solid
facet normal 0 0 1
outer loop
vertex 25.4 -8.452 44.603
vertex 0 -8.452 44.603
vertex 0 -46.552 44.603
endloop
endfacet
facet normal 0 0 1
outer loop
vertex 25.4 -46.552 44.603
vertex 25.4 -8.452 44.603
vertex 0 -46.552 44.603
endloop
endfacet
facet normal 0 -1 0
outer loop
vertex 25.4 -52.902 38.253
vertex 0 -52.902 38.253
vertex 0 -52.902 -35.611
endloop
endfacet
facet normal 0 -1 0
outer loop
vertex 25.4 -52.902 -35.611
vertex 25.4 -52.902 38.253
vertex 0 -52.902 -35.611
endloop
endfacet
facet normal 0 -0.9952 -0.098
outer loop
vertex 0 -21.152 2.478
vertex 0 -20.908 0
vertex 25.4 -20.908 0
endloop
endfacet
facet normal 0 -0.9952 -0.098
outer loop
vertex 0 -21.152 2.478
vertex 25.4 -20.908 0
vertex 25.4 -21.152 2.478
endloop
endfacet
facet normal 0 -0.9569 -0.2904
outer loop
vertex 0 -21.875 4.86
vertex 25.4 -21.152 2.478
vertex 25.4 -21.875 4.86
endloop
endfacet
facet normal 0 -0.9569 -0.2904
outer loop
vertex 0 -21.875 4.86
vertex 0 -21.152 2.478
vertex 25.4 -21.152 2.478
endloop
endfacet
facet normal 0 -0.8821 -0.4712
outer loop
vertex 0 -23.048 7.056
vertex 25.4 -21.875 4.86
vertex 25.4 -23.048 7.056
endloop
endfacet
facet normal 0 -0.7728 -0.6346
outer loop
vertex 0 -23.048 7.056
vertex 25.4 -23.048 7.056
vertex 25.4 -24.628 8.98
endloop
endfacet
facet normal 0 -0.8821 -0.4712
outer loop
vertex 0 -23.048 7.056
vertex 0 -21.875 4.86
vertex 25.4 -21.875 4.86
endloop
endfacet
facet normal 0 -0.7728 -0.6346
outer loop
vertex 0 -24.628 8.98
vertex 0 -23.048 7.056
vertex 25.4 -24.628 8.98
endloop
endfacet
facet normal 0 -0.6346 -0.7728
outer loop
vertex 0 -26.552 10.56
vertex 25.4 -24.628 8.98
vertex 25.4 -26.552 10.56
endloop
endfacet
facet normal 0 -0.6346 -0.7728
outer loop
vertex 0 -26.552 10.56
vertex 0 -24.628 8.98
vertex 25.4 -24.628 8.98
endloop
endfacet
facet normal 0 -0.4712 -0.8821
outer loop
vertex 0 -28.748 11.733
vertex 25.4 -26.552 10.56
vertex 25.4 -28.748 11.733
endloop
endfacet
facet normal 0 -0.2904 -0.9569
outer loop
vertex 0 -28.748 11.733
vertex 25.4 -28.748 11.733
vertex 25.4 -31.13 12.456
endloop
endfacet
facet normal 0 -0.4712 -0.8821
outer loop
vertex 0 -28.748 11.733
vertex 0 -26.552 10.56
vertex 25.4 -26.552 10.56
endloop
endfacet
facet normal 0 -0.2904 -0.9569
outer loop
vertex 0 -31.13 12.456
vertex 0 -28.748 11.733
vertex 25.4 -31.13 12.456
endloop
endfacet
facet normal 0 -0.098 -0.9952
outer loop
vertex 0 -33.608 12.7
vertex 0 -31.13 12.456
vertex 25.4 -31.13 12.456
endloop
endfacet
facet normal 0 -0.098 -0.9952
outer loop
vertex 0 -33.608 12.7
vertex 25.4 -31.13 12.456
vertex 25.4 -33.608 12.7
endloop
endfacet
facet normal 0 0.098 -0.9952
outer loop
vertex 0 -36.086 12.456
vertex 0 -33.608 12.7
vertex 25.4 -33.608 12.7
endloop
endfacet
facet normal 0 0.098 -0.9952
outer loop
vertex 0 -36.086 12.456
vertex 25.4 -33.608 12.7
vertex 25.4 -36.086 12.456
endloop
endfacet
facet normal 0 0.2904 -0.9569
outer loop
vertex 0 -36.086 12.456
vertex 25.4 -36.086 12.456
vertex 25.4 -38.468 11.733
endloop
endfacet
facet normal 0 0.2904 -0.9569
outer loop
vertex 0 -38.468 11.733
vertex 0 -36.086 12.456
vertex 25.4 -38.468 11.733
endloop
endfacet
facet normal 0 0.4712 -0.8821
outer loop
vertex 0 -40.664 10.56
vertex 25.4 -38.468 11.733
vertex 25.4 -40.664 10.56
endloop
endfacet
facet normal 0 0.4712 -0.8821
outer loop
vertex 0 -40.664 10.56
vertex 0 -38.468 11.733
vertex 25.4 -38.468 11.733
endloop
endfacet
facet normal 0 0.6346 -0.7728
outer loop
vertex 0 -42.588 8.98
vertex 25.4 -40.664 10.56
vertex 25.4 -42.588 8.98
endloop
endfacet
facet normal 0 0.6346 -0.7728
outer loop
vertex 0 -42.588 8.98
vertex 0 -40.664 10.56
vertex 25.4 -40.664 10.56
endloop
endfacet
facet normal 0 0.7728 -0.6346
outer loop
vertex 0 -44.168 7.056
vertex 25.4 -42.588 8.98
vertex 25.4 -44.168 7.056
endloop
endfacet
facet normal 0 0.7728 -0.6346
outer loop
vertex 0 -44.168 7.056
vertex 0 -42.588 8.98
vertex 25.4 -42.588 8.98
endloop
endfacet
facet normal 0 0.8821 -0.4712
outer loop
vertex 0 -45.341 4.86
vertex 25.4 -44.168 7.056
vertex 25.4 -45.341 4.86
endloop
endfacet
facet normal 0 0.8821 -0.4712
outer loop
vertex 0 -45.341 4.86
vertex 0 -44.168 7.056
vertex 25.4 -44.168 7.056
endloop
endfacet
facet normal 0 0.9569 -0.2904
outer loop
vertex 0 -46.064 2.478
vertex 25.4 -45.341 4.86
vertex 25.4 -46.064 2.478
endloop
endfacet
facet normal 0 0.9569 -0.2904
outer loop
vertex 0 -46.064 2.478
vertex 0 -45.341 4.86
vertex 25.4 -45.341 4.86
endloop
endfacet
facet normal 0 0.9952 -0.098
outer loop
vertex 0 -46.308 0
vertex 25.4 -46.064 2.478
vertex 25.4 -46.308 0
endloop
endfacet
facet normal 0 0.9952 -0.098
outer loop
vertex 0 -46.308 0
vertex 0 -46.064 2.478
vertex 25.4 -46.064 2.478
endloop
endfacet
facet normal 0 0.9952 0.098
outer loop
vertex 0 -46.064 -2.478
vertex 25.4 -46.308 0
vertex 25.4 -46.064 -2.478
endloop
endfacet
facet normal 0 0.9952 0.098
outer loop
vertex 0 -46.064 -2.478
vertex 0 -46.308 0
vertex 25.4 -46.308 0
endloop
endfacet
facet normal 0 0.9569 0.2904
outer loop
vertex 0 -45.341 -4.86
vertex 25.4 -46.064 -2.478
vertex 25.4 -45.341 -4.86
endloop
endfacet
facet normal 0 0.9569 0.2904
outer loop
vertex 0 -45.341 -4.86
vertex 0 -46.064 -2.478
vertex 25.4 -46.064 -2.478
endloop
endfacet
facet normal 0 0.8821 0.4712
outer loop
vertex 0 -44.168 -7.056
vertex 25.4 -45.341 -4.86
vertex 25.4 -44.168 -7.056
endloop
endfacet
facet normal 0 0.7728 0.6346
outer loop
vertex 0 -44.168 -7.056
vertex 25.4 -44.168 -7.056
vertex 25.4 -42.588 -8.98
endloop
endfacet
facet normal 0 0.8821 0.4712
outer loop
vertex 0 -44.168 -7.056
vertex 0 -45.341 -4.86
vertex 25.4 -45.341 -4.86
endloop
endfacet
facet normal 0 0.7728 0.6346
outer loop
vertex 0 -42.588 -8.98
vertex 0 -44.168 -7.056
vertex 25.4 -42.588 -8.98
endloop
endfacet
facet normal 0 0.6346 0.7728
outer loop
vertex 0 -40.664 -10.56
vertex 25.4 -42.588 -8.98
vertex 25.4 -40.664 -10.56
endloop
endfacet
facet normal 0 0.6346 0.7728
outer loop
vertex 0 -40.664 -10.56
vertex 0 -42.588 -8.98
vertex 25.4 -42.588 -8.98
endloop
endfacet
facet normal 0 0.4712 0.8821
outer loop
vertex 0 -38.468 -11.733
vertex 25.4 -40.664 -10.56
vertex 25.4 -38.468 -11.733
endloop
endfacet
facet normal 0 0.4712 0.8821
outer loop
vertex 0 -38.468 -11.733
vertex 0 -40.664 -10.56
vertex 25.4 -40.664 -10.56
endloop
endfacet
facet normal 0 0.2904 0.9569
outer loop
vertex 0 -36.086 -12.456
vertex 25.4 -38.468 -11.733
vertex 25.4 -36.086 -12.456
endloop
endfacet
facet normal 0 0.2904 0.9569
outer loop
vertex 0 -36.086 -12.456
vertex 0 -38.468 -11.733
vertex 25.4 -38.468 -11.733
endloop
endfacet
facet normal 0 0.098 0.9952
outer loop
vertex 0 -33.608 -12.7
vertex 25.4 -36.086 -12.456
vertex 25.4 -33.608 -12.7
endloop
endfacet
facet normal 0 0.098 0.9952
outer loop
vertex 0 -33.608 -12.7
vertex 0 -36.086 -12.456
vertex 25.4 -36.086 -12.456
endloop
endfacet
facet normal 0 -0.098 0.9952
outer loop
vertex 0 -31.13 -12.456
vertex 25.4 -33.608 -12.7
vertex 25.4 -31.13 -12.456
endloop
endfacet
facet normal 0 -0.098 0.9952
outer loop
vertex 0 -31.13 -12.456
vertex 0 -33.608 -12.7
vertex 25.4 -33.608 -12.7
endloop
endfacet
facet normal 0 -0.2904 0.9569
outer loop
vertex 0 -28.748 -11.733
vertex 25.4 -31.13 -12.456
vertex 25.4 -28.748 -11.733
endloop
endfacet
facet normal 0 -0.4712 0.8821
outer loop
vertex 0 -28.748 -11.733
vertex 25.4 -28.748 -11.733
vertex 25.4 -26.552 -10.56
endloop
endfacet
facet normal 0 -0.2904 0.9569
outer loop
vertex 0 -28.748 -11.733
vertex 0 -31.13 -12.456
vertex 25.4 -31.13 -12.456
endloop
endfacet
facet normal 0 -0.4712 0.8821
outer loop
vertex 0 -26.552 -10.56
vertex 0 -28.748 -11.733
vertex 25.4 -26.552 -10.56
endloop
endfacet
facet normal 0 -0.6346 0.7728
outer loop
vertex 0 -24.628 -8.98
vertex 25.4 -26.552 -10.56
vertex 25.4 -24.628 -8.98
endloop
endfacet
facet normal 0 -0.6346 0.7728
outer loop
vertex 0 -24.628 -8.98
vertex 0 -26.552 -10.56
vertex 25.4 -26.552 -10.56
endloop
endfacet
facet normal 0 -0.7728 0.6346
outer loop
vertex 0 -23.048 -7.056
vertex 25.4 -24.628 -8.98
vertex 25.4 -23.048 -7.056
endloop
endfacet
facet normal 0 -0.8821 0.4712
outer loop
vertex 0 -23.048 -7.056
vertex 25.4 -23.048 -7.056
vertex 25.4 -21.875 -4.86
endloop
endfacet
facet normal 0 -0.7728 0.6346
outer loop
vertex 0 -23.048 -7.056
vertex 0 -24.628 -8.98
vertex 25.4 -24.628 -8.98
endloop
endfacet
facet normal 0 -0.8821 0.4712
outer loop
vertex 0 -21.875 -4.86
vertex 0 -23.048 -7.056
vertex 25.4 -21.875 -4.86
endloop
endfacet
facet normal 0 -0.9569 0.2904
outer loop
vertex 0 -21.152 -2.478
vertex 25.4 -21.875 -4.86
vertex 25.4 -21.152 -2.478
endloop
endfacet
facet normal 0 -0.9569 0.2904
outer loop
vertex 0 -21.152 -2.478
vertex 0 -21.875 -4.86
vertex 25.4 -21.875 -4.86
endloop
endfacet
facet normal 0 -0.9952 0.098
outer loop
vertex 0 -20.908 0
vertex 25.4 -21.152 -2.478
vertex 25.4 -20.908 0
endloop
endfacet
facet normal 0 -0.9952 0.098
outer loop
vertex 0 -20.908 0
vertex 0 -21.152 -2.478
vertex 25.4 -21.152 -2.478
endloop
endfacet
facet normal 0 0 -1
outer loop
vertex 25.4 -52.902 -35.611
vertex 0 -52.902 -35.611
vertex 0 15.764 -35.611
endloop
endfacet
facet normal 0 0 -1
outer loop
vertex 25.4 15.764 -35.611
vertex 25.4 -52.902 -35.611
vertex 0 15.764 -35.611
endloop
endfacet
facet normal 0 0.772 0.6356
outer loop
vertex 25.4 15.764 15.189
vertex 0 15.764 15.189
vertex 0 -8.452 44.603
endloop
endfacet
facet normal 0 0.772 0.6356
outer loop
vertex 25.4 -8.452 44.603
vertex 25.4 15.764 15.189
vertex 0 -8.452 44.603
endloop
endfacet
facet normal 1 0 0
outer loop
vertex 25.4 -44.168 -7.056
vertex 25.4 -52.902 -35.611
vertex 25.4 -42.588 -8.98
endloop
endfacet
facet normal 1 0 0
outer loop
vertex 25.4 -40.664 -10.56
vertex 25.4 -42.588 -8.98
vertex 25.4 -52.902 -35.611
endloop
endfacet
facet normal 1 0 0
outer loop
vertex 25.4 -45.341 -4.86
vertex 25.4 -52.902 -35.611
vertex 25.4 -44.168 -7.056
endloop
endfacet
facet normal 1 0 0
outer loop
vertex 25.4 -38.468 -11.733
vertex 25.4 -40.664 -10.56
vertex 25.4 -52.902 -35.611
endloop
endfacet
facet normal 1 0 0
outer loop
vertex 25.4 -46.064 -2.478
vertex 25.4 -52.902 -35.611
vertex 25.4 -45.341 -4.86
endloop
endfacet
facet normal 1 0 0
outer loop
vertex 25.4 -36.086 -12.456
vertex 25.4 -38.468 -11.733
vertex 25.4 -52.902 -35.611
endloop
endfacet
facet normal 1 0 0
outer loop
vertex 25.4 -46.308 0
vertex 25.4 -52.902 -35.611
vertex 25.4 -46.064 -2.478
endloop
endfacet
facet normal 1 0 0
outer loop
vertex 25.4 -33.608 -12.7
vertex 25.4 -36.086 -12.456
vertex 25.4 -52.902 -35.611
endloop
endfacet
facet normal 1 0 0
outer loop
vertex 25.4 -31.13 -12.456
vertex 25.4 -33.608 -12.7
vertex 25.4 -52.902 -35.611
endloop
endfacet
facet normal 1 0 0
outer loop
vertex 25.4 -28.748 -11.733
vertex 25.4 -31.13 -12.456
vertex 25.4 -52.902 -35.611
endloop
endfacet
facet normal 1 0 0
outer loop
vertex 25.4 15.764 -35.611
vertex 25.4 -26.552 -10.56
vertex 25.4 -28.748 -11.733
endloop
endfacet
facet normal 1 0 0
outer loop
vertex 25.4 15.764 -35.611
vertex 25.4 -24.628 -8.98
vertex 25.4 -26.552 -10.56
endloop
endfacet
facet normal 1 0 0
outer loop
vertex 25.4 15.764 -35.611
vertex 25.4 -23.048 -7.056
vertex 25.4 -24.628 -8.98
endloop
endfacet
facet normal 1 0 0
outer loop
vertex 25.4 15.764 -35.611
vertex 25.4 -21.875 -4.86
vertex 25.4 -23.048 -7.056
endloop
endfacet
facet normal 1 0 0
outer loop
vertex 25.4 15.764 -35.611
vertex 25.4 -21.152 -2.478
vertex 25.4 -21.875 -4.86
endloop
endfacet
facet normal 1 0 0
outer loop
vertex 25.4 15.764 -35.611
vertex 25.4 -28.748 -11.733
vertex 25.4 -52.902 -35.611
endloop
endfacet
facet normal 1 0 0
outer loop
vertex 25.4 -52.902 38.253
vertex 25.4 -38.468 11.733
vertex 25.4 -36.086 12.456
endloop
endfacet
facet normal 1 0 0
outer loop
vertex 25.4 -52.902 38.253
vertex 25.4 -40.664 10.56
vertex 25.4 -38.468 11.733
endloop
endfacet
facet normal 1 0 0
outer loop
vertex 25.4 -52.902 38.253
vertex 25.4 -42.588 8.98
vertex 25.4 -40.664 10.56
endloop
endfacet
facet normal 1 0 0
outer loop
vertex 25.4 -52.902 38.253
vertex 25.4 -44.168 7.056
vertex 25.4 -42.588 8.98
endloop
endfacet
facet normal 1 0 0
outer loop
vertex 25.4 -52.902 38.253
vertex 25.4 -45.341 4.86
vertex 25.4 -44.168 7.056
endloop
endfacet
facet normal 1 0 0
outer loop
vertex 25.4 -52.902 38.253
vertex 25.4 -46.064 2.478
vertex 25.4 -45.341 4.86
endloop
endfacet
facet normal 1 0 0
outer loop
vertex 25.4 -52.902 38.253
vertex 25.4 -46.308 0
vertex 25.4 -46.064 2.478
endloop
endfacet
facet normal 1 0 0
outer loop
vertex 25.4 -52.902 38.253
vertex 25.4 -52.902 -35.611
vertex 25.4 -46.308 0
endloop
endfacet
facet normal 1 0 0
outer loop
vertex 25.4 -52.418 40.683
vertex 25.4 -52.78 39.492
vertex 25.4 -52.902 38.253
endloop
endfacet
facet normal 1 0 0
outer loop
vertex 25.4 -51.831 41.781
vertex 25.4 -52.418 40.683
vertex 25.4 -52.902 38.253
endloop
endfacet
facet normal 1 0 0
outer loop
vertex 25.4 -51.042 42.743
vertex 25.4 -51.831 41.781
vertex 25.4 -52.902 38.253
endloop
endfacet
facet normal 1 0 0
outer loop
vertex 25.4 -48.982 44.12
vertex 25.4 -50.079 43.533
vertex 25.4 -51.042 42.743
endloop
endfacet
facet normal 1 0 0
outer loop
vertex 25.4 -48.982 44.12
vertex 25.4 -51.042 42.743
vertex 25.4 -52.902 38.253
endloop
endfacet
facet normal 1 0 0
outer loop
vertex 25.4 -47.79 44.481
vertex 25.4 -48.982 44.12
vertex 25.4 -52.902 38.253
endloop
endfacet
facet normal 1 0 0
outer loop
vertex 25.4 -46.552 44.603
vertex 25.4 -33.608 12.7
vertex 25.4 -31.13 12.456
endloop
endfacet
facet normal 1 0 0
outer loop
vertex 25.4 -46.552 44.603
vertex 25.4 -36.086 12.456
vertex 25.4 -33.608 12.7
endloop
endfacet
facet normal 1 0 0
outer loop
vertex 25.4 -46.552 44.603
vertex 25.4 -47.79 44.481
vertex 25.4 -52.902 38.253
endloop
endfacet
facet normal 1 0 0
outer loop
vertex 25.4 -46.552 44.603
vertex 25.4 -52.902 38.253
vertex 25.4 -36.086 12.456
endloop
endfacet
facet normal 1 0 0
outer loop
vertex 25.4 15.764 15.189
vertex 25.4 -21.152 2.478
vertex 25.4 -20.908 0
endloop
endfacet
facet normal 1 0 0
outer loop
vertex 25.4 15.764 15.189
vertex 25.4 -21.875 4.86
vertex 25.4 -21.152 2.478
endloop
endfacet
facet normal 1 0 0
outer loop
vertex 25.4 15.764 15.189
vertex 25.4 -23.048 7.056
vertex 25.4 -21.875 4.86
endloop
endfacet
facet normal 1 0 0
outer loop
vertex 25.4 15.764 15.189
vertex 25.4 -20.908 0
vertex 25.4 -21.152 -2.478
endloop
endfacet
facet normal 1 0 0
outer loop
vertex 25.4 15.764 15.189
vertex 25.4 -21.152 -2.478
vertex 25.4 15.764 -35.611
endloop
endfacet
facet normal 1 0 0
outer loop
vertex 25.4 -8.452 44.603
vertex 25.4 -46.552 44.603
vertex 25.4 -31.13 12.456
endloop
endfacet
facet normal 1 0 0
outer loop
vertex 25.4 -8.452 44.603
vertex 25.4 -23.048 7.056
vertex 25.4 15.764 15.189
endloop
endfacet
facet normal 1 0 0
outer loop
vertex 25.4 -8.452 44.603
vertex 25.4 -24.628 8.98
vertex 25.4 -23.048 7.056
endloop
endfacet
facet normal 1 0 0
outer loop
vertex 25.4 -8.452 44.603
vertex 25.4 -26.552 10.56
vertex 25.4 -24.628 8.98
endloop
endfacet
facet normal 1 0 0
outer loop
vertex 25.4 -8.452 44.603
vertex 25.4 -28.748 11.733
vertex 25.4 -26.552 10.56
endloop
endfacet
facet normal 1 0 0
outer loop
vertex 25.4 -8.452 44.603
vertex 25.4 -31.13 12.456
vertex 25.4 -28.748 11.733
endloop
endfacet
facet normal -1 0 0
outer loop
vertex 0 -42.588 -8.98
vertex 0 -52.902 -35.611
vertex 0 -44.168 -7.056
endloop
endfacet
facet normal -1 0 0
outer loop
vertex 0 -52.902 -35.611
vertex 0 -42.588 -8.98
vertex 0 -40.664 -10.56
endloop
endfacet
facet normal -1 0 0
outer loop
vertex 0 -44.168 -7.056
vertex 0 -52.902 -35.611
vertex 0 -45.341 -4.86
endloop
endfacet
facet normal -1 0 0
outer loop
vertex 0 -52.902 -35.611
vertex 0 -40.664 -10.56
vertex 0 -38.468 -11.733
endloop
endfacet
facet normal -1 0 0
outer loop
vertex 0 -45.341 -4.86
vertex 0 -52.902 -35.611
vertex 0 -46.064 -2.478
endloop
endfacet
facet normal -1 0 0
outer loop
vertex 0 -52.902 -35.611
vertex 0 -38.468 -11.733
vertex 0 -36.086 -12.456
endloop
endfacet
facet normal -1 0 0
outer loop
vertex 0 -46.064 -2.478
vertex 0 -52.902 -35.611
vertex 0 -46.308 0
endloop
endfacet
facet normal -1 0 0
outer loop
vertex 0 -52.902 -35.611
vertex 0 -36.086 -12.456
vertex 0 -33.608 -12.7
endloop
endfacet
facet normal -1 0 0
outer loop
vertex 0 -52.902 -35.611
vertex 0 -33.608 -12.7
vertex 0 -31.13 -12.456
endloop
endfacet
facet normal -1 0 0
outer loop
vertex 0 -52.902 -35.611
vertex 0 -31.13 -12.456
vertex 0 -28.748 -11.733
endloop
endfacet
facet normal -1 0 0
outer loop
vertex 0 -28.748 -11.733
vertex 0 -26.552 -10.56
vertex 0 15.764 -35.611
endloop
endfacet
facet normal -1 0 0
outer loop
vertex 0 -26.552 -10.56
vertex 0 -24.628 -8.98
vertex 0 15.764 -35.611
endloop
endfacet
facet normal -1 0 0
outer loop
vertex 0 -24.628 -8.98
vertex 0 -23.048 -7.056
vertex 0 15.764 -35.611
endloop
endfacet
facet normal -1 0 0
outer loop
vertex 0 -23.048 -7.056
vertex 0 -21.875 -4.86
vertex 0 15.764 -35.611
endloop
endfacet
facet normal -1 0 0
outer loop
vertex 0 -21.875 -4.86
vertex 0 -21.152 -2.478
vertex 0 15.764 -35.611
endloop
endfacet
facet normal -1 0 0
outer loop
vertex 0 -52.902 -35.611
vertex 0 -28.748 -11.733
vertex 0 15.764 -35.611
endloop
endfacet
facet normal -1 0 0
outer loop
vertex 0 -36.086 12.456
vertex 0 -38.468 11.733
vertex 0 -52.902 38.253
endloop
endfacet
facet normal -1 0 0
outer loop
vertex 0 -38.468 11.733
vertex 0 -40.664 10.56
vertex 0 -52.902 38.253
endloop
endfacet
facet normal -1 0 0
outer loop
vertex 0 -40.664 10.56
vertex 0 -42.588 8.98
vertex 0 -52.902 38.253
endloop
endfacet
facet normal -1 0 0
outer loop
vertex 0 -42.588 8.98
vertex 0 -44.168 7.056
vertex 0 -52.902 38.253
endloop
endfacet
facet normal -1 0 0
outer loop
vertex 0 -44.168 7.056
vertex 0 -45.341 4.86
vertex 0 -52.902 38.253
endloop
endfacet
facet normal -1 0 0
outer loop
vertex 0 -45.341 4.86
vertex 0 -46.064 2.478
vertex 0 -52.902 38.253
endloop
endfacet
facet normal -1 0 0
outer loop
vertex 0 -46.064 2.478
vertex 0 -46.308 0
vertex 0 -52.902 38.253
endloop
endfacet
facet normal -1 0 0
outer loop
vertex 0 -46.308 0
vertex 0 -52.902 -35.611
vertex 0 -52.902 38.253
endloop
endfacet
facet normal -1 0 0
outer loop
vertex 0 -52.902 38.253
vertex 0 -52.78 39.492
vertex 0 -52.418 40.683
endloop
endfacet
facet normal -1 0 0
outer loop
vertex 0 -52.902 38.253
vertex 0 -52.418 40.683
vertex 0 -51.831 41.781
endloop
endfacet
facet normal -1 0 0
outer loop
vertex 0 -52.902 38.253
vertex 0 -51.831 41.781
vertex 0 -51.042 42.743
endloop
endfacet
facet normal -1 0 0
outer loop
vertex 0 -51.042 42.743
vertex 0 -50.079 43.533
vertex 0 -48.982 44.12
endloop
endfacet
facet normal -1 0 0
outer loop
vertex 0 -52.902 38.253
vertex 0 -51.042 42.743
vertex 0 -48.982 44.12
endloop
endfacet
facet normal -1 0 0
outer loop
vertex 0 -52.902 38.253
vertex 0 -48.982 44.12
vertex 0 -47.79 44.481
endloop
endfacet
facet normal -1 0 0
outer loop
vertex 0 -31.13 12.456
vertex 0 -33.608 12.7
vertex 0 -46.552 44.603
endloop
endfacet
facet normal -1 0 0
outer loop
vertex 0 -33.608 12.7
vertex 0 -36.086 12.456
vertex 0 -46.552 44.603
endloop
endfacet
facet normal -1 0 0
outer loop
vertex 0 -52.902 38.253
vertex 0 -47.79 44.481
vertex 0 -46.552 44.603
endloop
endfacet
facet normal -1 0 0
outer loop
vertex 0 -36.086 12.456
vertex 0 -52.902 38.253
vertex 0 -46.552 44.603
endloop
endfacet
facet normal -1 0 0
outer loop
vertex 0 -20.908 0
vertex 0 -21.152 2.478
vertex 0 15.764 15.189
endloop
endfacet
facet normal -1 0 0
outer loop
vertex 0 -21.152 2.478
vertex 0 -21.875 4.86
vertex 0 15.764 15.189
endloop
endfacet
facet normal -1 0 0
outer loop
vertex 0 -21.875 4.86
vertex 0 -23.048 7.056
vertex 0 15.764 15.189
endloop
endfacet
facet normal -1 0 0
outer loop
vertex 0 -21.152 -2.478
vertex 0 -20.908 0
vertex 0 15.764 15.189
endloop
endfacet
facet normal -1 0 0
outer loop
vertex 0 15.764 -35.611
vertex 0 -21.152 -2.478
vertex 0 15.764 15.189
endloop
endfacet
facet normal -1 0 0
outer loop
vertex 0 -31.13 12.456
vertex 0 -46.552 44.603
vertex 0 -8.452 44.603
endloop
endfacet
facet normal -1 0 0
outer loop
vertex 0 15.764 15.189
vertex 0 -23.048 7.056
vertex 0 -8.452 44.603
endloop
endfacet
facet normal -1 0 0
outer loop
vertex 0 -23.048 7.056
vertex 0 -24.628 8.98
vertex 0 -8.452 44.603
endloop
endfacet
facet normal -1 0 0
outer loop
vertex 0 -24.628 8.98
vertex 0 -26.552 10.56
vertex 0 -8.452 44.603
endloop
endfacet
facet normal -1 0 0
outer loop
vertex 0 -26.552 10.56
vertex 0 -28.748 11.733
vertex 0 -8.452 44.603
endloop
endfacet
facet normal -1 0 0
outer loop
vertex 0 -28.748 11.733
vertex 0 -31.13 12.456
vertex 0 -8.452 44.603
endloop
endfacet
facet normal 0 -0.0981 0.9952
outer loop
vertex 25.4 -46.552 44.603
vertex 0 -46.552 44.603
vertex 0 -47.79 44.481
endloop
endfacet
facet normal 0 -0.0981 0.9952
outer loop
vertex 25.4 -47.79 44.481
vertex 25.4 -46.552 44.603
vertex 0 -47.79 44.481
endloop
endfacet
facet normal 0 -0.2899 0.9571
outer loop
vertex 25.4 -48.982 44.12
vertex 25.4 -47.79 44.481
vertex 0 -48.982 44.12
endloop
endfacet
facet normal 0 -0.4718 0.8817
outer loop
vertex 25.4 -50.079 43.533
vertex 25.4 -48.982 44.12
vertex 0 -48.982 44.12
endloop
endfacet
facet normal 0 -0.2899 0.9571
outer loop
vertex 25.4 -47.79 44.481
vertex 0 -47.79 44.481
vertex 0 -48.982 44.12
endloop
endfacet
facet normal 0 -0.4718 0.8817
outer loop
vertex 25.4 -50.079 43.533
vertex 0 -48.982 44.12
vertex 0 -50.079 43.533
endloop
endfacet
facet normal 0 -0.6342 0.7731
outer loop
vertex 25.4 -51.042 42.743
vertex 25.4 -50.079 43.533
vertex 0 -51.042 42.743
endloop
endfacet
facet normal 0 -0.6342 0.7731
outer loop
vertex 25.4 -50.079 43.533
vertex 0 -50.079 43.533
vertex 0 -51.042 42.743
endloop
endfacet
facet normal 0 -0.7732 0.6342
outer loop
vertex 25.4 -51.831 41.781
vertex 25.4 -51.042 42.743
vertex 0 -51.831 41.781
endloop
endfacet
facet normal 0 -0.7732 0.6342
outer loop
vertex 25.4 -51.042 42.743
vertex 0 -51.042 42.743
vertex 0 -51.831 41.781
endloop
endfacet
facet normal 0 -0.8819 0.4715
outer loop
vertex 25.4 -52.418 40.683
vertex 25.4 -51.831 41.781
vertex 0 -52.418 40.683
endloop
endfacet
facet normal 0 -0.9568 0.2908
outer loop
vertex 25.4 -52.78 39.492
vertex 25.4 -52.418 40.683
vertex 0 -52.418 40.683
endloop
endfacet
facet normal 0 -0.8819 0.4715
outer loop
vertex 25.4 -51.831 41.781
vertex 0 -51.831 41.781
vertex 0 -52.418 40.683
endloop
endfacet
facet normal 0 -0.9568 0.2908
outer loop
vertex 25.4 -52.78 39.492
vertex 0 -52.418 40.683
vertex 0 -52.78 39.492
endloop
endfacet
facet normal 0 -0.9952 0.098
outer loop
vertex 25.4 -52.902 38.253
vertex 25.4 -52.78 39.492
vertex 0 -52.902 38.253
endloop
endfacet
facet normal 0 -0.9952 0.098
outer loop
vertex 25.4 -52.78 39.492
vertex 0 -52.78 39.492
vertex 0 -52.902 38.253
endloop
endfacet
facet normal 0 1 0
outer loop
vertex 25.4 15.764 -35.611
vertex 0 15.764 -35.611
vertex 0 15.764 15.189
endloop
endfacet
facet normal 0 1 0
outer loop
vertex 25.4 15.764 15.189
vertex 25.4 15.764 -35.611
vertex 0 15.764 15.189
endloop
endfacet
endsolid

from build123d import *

# Parameters (mm, degrees)
F0_R     = 12.7
F1_DEPTH = 25.4


with BuildPart() as f1:
    # F0 (on Right) → F1 (new body)
    with BuildSketch(Plane.YZ):
        with BuildLine():
            Line((-8.451596, 44.603311), (-46.551596, 44.603311))
            ThreePointArc((-46.551596, 44.603311), (-51.041724, 42.743439), (-52.901596, 38.253311))
            Line((-52.901596, 38.253311), (-52.901596, -35.611195))
            Line((-52.901596, -35.611195), (15.764037, -35.611195))
            Line((15.764037, -35.611195), (15.764037, 15.188805))
            Line((15.764037, 15.188805), (-8.451596, 44.603311))
        make_face()
        with Locations((-33.608079, 0)):
            Circle(F0_R, mode=Mode.SUBTRACT)
    extrude(amount=F1_DEPTH)


solid = f1.part
